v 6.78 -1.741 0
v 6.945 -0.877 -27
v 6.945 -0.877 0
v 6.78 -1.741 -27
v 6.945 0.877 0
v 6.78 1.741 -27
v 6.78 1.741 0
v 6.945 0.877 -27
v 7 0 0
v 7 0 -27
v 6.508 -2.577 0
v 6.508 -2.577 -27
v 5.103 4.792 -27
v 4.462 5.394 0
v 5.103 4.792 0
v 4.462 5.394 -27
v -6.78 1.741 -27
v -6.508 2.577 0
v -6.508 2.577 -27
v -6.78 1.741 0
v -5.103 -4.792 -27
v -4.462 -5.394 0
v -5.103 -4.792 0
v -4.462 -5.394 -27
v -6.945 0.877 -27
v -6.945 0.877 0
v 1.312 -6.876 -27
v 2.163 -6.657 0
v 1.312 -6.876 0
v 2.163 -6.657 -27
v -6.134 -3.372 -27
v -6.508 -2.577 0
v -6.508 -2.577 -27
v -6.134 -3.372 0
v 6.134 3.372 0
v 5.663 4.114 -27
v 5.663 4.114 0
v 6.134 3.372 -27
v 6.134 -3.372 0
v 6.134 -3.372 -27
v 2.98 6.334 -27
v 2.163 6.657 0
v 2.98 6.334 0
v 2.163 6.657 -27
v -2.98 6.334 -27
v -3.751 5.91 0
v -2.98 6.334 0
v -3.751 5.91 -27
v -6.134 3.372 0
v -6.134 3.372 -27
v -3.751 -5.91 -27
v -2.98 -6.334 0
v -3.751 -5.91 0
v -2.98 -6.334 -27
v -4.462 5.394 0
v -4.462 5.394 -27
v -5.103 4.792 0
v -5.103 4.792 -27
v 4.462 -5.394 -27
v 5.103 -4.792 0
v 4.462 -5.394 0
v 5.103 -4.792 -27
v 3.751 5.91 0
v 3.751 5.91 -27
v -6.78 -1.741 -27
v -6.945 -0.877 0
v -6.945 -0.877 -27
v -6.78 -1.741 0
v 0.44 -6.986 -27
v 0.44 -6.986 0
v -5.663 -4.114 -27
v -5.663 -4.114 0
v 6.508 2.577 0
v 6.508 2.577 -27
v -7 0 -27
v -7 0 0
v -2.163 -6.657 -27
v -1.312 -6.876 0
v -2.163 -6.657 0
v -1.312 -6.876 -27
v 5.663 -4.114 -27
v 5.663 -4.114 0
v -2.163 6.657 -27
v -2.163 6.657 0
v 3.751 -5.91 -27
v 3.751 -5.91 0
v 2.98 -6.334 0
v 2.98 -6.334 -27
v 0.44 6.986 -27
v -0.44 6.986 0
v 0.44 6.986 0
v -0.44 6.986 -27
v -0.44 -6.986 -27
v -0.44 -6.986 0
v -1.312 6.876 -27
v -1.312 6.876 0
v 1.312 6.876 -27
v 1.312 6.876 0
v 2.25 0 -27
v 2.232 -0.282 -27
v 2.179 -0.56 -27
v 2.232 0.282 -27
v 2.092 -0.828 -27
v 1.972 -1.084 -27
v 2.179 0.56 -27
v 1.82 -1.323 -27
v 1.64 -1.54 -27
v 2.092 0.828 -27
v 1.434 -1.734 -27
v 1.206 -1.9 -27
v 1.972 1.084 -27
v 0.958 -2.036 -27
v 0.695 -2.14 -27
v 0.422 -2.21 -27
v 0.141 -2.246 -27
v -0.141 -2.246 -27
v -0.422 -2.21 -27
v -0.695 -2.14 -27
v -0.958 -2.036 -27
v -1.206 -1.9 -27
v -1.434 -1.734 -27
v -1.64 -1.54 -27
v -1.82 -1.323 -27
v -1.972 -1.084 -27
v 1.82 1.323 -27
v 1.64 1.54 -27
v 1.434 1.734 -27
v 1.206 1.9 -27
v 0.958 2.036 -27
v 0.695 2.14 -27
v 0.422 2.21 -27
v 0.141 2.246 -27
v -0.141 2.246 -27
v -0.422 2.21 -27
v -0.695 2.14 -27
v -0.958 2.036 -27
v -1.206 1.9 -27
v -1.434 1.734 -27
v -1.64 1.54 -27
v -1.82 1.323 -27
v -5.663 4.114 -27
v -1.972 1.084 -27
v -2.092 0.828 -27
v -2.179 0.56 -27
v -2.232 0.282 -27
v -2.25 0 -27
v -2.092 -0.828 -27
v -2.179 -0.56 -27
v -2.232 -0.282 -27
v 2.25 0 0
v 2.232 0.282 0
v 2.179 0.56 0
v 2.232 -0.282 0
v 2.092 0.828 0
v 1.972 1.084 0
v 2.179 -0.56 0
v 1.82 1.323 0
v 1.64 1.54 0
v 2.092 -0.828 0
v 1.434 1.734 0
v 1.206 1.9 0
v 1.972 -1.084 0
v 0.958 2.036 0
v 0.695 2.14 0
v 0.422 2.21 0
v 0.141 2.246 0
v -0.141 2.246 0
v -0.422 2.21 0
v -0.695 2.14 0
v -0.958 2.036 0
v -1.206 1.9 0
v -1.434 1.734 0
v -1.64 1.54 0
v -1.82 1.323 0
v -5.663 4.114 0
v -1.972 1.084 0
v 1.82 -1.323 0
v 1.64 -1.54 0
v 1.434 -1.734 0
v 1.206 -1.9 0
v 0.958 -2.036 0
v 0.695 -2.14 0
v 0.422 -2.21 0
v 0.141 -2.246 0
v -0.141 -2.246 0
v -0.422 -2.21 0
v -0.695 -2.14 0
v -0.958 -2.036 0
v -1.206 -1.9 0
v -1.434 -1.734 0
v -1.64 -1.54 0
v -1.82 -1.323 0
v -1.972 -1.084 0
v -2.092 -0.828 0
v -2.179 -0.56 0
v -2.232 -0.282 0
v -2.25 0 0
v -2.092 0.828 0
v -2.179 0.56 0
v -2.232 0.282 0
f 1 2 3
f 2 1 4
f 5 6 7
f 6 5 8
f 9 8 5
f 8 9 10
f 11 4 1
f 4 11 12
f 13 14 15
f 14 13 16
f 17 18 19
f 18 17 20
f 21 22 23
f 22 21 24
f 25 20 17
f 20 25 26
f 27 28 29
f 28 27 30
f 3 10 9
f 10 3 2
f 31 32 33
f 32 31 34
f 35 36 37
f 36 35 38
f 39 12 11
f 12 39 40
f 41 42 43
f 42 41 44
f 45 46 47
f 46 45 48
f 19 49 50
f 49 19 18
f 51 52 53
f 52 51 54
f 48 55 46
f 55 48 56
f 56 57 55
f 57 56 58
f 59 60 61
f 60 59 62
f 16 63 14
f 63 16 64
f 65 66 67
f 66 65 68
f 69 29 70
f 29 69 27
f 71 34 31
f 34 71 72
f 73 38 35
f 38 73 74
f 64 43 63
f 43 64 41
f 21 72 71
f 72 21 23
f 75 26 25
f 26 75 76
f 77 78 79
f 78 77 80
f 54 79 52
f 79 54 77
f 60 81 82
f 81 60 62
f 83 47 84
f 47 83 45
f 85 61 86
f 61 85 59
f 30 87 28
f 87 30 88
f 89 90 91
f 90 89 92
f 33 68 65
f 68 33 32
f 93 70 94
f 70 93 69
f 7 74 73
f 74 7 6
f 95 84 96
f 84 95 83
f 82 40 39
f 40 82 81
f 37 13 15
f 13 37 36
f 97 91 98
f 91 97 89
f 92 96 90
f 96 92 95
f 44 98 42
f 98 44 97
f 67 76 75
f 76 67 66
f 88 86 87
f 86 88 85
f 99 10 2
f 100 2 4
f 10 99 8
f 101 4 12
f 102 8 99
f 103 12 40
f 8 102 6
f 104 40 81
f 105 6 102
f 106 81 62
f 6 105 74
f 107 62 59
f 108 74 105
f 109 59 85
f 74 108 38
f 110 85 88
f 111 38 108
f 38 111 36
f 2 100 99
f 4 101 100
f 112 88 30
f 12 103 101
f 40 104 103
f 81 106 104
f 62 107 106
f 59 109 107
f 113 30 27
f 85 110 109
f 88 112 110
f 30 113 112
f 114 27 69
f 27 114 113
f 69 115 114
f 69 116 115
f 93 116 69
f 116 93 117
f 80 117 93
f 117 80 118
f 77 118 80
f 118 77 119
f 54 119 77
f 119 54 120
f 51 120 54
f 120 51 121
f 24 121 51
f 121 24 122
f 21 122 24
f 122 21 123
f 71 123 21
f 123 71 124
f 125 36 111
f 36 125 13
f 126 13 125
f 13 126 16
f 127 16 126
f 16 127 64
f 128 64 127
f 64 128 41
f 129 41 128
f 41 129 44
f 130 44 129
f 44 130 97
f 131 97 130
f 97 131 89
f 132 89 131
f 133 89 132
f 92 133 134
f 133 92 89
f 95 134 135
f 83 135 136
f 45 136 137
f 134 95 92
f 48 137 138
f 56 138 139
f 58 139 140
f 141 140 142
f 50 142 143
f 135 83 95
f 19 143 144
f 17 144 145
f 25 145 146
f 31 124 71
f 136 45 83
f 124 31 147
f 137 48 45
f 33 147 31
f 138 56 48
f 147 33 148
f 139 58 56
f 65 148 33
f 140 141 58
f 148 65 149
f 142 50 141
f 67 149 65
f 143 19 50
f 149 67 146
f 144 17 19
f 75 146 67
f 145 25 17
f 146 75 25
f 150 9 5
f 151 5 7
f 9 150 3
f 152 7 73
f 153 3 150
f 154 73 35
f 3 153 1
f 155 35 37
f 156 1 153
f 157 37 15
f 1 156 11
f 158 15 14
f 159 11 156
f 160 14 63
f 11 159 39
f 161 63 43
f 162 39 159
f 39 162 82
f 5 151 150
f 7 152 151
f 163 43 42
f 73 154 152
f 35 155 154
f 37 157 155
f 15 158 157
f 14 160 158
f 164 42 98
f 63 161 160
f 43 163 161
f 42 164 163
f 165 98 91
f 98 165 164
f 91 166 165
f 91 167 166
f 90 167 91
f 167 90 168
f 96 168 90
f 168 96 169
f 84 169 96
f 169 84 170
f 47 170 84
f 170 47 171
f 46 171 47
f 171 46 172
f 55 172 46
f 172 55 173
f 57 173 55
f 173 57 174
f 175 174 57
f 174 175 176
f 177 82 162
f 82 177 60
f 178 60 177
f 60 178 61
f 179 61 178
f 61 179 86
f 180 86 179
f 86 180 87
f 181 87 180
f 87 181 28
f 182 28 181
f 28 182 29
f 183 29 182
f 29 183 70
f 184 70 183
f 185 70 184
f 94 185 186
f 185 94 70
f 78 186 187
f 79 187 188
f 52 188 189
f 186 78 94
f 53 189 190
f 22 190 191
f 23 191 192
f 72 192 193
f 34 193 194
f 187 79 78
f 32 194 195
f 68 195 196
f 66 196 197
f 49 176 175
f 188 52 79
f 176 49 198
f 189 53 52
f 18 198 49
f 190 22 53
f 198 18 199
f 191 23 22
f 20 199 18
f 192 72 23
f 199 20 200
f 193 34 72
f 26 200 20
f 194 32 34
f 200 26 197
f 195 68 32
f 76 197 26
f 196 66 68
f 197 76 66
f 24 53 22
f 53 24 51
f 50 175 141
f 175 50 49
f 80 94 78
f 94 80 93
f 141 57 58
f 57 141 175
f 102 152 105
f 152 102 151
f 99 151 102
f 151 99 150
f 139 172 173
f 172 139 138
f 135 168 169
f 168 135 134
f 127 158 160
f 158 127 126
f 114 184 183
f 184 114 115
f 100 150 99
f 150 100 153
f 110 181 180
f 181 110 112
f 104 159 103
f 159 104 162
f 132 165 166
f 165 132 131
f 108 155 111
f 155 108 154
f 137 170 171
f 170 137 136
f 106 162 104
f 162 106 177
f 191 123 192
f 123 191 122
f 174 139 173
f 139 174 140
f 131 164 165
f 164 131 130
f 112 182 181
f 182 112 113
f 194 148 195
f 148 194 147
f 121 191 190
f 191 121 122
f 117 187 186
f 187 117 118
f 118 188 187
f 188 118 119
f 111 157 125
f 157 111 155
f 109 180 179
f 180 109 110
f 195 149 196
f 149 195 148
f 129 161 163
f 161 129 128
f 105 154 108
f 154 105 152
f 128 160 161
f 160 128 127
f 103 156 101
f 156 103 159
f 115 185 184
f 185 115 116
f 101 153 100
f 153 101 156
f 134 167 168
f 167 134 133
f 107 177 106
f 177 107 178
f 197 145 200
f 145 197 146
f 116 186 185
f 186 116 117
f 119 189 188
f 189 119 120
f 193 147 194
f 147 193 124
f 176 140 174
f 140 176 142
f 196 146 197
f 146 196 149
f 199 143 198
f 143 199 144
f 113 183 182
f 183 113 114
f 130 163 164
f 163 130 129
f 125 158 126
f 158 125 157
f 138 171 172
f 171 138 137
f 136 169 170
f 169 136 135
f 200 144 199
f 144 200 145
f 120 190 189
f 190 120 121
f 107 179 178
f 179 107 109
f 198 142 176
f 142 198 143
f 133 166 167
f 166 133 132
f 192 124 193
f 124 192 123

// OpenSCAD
$fn = 50;


difference() {
	union() {
		translate(v = [0, 0, -27.0000000000]) {
			cylinder(h = 27, r = 7.0000000000);
		}
		cylinder(h = 0, r = 13.0000000000);
	}
	union() {
		#translate(v = [0, 0, -27]) {
			cylinder(h = 27, r = 2.2500000000);
		}
	}
}
